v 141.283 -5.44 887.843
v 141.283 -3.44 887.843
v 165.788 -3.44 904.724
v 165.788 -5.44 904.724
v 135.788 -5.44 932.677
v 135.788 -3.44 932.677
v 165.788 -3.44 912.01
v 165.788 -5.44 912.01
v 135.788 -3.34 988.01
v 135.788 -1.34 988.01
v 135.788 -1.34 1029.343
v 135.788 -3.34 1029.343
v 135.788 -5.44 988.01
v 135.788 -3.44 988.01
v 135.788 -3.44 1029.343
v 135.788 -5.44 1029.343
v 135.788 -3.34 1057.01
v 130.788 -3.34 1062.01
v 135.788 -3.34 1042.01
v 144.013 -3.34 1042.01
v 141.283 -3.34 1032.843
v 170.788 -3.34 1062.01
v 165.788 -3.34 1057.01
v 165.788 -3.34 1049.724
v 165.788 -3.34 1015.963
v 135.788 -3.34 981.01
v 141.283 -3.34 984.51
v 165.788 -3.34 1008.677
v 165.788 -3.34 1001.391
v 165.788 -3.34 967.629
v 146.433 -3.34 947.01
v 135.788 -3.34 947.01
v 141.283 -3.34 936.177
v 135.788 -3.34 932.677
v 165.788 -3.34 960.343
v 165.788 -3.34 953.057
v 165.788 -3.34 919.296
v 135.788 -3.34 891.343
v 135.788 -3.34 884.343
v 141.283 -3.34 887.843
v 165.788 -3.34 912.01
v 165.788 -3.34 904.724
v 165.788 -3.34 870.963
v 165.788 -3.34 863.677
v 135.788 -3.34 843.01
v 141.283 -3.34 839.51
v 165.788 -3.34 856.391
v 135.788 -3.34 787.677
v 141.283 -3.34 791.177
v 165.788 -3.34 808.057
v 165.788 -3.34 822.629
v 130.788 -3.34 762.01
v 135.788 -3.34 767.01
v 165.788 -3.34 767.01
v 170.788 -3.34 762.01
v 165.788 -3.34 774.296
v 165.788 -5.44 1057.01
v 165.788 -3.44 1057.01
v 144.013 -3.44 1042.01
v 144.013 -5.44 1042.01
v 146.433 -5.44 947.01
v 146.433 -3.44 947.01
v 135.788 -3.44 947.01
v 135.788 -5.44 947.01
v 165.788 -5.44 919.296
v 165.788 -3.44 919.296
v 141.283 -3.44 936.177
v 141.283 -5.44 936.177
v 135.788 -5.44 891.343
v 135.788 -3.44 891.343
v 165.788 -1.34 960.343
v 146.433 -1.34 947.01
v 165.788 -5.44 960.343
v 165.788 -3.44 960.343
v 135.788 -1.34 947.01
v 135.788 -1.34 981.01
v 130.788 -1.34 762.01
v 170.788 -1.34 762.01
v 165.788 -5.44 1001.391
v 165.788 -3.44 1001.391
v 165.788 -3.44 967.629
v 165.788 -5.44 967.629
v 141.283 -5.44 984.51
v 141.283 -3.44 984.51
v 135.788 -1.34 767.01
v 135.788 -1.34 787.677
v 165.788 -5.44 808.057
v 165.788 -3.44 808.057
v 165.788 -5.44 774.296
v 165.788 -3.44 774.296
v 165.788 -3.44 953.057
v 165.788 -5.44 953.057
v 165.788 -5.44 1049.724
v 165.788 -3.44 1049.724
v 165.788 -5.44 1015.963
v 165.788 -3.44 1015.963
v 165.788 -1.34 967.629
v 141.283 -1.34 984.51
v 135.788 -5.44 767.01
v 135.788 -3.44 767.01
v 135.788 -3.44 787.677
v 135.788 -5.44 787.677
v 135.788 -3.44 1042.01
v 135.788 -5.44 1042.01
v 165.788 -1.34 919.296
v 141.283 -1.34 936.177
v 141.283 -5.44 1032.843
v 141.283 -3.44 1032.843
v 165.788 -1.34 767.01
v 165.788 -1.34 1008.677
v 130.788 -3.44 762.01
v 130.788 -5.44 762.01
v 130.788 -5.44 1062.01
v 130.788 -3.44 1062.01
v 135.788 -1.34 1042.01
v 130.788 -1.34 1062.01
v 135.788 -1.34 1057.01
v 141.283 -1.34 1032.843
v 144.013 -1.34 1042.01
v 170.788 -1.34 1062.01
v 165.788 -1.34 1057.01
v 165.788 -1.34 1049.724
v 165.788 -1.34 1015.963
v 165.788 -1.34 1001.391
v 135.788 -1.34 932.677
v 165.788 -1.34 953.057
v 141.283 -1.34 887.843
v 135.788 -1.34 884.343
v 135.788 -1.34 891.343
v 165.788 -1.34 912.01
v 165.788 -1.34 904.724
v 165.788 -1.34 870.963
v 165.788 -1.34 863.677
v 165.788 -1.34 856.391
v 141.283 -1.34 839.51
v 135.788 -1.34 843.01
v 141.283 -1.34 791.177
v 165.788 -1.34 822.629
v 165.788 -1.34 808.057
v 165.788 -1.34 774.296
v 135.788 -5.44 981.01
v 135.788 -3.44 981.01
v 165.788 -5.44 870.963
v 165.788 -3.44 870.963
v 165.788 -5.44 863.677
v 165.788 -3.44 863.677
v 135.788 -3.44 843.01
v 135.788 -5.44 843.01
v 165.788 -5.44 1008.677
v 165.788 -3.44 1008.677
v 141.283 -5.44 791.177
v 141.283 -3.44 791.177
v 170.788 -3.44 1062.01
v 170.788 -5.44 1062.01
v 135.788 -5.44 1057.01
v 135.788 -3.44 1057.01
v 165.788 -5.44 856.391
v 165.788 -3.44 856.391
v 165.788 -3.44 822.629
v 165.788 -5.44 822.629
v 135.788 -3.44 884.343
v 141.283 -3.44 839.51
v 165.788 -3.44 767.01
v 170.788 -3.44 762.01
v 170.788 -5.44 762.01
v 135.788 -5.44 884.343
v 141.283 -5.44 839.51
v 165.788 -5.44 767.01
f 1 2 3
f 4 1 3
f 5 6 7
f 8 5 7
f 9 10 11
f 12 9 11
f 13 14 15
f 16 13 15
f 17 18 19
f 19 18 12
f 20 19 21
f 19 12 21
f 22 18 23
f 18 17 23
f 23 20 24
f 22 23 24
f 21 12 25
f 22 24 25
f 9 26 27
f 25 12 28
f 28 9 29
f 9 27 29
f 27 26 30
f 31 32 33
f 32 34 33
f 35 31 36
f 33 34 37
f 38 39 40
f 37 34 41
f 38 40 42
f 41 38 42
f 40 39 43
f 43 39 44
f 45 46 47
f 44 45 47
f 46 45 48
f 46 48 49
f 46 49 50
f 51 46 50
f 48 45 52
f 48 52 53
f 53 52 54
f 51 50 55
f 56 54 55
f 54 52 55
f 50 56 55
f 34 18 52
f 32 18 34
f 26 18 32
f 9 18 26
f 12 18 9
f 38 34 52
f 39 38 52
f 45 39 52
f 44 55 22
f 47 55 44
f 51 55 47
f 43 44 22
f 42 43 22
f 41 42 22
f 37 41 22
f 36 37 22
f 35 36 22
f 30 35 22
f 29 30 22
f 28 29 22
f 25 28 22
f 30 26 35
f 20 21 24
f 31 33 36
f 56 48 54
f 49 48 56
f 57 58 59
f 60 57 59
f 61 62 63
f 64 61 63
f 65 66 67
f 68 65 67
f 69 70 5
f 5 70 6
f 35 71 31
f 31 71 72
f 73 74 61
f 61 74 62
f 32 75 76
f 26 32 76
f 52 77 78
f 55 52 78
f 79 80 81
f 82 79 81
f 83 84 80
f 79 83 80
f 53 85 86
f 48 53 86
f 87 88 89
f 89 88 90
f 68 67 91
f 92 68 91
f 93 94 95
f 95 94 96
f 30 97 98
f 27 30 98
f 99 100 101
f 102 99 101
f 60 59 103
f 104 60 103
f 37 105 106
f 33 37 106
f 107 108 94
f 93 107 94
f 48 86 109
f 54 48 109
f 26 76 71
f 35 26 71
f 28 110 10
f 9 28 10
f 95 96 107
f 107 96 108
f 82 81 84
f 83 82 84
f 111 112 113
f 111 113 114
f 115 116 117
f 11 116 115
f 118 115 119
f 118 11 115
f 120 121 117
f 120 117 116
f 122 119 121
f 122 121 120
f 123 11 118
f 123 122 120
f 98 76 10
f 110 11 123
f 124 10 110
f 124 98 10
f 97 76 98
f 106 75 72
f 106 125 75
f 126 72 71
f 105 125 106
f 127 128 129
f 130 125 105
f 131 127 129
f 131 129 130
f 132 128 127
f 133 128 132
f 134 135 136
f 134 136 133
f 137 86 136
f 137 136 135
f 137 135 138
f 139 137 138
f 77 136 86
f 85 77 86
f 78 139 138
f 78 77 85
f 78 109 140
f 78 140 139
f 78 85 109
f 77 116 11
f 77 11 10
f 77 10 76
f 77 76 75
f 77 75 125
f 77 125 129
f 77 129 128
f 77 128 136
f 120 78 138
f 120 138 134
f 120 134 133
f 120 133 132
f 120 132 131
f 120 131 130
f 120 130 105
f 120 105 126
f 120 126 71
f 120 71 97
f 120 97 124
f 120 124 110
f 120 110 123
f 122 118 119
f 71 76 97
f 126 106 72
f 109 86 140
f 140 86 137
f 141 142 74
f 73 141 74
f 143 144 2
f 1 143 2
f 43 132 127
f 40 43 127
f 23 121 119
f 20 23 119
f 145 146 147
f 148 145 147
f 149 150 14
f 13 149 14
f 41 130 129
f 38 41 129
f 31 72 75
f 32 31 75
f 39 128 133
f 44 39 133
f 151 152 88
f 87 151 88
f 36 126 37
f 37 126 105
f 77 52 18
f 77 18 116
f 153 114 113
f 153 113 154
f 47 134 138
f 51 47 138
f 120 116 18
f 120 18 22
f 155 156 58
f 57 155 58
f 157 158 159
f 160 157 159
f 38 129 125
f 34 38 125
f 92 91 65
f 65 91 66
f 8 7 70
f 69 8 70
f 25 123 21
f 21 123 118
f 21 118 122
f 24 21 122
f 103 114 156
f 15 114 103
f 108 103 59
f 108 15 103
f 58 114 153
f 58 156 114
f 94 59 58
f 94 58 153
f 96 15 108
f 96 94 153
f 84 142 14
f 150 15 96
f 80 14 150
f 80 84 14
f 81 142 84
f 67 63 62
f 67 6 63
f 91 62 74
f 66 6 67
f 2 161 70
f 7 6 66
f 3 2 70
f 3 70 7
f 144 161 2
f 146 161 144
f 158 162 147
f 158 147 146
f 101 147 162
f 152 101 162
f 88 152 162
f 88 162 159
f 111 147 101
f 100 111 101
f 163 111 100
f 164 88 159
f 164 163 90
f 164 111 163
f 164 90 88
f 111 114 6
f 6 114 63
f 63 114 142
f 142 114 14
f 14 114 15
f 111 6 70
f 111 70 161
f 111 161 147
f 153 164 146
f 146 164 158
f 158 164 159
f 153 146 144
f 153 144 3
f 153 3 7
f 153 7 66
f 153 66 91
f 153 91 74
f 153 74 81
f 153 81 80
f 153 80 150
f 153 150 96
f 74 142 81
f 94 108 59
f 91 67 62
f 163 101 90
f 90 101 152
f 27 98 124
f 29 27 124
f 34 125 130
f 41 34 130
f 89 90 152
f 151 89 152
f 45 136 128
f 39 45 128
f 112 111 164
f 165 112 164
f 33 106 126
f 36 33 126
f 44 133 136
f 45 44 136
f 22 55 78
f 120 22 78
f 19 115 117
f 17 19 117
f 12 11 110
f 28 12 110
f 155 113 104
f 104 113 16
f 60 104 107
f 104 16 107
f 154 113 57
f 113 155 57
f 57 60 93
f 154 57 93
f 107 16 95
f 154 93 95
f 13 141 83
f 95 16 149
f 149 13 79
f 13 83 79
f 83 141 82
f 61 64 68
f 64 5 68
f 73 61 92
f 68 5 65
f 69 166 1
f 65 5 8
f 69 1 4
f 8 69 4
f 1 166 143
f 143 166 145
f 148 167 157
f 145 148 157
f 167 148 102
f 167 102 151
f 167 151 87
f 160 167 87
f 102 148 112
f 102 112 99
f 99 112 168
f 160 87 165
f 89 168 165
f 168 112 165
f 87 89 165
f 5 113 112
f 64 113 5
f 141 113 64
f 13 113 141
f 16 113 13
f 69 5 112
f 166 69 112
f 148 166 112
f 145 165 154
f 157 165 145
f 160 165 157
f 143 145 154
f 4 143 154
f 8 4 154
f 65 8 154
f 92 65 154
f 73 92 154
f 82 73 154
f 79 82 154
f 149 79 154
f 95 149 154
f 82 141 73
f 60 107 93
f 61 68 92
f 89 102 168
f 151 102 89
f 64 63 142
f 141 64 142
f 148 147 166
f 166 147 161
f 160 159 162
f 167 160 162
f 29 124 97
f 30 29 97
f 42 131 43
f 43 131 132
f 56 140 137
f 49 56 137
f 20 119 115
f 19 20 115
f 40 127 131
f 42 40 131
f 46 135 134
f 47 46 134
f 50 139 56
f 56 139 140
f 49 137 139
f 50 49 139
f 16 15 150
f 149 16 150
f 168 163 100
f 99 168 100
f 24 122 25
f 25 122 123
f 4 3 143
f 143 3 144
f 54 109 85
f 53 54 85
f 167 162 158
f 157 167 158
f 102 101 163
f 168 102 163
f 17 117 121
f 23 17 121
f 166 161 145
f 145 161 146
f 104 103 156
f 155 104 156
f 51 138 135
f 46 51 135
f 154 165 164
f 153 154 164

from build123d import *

# Parameters (mm, degrees)
SKETCH_2_W          = 40
SKETCH_2_H          = 2
EXTRUDE_1_DEPTH     = 300
EXTRUDE_1_2_DEPTH   = 300
CUT_EXTRUDE_1_DEPTH = 1076.662797098


with BuildPart() as part:
    # 草图2 → 凸台-拉伸1 (new body)
    with BuildSketch(Plane.XY.offset(762.01)):
        with Locations((150.787596038, -2.339694097)):
            Rectangle(SKETCH_2_W, SKETCH_2_H)
    extrude(amount=EXTRUDE_1_DEPTH)


with BuildPart() as body_2:
    # 草图2 → Extrude 1 2 (new body)
    with BuildSketch(Plane.XY.offset(762.01)):
        with Locations((150.787596038, -4.439694097)):
            Rectangle(SKETCH_2_W, SKETCH_2_H)
    extrude(amount=EXTRUDE_1_2_DEPTH)


with BuildPart() as cut_extrude_1_tool:
    # 草图3 → 切除-拉伸1 (new, through all)
    with BuildSketch(Plane(origin=(0, -1.339694097, 0), x_dir=(1, 0, 0), z_dir=(0, 1, 0))):
        Polygon((135.787596038, -1057.01), (165.787596038, -1057.01), (144.013402489, -1042.01), (135.787596038, -1042.01), align=None)
        Polygon((141.283267851, -1032.843333333), (165.787596038, -1049.724092751), (165.787596038, -1015.962573916), align=None)
        Polygon((135.787596038, -1029.343333333), (165.787596038, -1008.676666667), (135.787596038, -988.01), align=None)
        Polygon((141.283267851, -984.51), (165.787596038, -1001.390759417), (165.787596038, -967.629240583), align=None)
        Polygon((135.787596038, -947.01), (135.787596038, -981.01), (165.787596038, -960.343333333), (146.432757328, -947.01), align=None)
        Polygon((141.283267851, -936.176666667), (165.787596038, -953.057426084), (165.787596038, -919.295907249), align=None)
        Polygon((135.787596038, -891.343333333), (135.787596038, -932.676666667), (165.787596038, -912.01), align=None)
        Polygon((141.283267851, -887.843333333), (165.787596038, -904.724092751), (165.787596038, -870.962573916), align=None)
        Polygon((135.787596038, -843.01), (135.787596038, -884.343333333), (165.787596038, -863.676666667), align=None)
        Polygon((141.283267851, -839.51), (165.787596038, -856.390759417), (165.787596038, -822.629240583), align=None)
        Polygon((135.787596038, -767.01), (135.787596038, -787.676666667), (165.787596038, -767.01), align=None)
        Polygon((141.283267851, -791.176666667), (165.787596038, -808.057426084), (165.787596038, -774.295907249), align=None)
    extrude(amount=-CUT_EXTRUDE_1_DEPTH)


with BuildPart() as part_1:
    add(part.part)

    # 切除-拉伸1: cut by cut_extrude_1_tool
    add(cut_extrude_1_tool.part, mode=Mode.SUBTRACT)


with BuildPart() as body_2_1:
    add(body_2.part)

    # 切除-拉伸1: cut by cut_extrude_1_tool
    add(cut_extrude_1_tool.part, mode=Mode.SUBTRACT)


solid = Compound([part_1.part, body_2_1.part])
